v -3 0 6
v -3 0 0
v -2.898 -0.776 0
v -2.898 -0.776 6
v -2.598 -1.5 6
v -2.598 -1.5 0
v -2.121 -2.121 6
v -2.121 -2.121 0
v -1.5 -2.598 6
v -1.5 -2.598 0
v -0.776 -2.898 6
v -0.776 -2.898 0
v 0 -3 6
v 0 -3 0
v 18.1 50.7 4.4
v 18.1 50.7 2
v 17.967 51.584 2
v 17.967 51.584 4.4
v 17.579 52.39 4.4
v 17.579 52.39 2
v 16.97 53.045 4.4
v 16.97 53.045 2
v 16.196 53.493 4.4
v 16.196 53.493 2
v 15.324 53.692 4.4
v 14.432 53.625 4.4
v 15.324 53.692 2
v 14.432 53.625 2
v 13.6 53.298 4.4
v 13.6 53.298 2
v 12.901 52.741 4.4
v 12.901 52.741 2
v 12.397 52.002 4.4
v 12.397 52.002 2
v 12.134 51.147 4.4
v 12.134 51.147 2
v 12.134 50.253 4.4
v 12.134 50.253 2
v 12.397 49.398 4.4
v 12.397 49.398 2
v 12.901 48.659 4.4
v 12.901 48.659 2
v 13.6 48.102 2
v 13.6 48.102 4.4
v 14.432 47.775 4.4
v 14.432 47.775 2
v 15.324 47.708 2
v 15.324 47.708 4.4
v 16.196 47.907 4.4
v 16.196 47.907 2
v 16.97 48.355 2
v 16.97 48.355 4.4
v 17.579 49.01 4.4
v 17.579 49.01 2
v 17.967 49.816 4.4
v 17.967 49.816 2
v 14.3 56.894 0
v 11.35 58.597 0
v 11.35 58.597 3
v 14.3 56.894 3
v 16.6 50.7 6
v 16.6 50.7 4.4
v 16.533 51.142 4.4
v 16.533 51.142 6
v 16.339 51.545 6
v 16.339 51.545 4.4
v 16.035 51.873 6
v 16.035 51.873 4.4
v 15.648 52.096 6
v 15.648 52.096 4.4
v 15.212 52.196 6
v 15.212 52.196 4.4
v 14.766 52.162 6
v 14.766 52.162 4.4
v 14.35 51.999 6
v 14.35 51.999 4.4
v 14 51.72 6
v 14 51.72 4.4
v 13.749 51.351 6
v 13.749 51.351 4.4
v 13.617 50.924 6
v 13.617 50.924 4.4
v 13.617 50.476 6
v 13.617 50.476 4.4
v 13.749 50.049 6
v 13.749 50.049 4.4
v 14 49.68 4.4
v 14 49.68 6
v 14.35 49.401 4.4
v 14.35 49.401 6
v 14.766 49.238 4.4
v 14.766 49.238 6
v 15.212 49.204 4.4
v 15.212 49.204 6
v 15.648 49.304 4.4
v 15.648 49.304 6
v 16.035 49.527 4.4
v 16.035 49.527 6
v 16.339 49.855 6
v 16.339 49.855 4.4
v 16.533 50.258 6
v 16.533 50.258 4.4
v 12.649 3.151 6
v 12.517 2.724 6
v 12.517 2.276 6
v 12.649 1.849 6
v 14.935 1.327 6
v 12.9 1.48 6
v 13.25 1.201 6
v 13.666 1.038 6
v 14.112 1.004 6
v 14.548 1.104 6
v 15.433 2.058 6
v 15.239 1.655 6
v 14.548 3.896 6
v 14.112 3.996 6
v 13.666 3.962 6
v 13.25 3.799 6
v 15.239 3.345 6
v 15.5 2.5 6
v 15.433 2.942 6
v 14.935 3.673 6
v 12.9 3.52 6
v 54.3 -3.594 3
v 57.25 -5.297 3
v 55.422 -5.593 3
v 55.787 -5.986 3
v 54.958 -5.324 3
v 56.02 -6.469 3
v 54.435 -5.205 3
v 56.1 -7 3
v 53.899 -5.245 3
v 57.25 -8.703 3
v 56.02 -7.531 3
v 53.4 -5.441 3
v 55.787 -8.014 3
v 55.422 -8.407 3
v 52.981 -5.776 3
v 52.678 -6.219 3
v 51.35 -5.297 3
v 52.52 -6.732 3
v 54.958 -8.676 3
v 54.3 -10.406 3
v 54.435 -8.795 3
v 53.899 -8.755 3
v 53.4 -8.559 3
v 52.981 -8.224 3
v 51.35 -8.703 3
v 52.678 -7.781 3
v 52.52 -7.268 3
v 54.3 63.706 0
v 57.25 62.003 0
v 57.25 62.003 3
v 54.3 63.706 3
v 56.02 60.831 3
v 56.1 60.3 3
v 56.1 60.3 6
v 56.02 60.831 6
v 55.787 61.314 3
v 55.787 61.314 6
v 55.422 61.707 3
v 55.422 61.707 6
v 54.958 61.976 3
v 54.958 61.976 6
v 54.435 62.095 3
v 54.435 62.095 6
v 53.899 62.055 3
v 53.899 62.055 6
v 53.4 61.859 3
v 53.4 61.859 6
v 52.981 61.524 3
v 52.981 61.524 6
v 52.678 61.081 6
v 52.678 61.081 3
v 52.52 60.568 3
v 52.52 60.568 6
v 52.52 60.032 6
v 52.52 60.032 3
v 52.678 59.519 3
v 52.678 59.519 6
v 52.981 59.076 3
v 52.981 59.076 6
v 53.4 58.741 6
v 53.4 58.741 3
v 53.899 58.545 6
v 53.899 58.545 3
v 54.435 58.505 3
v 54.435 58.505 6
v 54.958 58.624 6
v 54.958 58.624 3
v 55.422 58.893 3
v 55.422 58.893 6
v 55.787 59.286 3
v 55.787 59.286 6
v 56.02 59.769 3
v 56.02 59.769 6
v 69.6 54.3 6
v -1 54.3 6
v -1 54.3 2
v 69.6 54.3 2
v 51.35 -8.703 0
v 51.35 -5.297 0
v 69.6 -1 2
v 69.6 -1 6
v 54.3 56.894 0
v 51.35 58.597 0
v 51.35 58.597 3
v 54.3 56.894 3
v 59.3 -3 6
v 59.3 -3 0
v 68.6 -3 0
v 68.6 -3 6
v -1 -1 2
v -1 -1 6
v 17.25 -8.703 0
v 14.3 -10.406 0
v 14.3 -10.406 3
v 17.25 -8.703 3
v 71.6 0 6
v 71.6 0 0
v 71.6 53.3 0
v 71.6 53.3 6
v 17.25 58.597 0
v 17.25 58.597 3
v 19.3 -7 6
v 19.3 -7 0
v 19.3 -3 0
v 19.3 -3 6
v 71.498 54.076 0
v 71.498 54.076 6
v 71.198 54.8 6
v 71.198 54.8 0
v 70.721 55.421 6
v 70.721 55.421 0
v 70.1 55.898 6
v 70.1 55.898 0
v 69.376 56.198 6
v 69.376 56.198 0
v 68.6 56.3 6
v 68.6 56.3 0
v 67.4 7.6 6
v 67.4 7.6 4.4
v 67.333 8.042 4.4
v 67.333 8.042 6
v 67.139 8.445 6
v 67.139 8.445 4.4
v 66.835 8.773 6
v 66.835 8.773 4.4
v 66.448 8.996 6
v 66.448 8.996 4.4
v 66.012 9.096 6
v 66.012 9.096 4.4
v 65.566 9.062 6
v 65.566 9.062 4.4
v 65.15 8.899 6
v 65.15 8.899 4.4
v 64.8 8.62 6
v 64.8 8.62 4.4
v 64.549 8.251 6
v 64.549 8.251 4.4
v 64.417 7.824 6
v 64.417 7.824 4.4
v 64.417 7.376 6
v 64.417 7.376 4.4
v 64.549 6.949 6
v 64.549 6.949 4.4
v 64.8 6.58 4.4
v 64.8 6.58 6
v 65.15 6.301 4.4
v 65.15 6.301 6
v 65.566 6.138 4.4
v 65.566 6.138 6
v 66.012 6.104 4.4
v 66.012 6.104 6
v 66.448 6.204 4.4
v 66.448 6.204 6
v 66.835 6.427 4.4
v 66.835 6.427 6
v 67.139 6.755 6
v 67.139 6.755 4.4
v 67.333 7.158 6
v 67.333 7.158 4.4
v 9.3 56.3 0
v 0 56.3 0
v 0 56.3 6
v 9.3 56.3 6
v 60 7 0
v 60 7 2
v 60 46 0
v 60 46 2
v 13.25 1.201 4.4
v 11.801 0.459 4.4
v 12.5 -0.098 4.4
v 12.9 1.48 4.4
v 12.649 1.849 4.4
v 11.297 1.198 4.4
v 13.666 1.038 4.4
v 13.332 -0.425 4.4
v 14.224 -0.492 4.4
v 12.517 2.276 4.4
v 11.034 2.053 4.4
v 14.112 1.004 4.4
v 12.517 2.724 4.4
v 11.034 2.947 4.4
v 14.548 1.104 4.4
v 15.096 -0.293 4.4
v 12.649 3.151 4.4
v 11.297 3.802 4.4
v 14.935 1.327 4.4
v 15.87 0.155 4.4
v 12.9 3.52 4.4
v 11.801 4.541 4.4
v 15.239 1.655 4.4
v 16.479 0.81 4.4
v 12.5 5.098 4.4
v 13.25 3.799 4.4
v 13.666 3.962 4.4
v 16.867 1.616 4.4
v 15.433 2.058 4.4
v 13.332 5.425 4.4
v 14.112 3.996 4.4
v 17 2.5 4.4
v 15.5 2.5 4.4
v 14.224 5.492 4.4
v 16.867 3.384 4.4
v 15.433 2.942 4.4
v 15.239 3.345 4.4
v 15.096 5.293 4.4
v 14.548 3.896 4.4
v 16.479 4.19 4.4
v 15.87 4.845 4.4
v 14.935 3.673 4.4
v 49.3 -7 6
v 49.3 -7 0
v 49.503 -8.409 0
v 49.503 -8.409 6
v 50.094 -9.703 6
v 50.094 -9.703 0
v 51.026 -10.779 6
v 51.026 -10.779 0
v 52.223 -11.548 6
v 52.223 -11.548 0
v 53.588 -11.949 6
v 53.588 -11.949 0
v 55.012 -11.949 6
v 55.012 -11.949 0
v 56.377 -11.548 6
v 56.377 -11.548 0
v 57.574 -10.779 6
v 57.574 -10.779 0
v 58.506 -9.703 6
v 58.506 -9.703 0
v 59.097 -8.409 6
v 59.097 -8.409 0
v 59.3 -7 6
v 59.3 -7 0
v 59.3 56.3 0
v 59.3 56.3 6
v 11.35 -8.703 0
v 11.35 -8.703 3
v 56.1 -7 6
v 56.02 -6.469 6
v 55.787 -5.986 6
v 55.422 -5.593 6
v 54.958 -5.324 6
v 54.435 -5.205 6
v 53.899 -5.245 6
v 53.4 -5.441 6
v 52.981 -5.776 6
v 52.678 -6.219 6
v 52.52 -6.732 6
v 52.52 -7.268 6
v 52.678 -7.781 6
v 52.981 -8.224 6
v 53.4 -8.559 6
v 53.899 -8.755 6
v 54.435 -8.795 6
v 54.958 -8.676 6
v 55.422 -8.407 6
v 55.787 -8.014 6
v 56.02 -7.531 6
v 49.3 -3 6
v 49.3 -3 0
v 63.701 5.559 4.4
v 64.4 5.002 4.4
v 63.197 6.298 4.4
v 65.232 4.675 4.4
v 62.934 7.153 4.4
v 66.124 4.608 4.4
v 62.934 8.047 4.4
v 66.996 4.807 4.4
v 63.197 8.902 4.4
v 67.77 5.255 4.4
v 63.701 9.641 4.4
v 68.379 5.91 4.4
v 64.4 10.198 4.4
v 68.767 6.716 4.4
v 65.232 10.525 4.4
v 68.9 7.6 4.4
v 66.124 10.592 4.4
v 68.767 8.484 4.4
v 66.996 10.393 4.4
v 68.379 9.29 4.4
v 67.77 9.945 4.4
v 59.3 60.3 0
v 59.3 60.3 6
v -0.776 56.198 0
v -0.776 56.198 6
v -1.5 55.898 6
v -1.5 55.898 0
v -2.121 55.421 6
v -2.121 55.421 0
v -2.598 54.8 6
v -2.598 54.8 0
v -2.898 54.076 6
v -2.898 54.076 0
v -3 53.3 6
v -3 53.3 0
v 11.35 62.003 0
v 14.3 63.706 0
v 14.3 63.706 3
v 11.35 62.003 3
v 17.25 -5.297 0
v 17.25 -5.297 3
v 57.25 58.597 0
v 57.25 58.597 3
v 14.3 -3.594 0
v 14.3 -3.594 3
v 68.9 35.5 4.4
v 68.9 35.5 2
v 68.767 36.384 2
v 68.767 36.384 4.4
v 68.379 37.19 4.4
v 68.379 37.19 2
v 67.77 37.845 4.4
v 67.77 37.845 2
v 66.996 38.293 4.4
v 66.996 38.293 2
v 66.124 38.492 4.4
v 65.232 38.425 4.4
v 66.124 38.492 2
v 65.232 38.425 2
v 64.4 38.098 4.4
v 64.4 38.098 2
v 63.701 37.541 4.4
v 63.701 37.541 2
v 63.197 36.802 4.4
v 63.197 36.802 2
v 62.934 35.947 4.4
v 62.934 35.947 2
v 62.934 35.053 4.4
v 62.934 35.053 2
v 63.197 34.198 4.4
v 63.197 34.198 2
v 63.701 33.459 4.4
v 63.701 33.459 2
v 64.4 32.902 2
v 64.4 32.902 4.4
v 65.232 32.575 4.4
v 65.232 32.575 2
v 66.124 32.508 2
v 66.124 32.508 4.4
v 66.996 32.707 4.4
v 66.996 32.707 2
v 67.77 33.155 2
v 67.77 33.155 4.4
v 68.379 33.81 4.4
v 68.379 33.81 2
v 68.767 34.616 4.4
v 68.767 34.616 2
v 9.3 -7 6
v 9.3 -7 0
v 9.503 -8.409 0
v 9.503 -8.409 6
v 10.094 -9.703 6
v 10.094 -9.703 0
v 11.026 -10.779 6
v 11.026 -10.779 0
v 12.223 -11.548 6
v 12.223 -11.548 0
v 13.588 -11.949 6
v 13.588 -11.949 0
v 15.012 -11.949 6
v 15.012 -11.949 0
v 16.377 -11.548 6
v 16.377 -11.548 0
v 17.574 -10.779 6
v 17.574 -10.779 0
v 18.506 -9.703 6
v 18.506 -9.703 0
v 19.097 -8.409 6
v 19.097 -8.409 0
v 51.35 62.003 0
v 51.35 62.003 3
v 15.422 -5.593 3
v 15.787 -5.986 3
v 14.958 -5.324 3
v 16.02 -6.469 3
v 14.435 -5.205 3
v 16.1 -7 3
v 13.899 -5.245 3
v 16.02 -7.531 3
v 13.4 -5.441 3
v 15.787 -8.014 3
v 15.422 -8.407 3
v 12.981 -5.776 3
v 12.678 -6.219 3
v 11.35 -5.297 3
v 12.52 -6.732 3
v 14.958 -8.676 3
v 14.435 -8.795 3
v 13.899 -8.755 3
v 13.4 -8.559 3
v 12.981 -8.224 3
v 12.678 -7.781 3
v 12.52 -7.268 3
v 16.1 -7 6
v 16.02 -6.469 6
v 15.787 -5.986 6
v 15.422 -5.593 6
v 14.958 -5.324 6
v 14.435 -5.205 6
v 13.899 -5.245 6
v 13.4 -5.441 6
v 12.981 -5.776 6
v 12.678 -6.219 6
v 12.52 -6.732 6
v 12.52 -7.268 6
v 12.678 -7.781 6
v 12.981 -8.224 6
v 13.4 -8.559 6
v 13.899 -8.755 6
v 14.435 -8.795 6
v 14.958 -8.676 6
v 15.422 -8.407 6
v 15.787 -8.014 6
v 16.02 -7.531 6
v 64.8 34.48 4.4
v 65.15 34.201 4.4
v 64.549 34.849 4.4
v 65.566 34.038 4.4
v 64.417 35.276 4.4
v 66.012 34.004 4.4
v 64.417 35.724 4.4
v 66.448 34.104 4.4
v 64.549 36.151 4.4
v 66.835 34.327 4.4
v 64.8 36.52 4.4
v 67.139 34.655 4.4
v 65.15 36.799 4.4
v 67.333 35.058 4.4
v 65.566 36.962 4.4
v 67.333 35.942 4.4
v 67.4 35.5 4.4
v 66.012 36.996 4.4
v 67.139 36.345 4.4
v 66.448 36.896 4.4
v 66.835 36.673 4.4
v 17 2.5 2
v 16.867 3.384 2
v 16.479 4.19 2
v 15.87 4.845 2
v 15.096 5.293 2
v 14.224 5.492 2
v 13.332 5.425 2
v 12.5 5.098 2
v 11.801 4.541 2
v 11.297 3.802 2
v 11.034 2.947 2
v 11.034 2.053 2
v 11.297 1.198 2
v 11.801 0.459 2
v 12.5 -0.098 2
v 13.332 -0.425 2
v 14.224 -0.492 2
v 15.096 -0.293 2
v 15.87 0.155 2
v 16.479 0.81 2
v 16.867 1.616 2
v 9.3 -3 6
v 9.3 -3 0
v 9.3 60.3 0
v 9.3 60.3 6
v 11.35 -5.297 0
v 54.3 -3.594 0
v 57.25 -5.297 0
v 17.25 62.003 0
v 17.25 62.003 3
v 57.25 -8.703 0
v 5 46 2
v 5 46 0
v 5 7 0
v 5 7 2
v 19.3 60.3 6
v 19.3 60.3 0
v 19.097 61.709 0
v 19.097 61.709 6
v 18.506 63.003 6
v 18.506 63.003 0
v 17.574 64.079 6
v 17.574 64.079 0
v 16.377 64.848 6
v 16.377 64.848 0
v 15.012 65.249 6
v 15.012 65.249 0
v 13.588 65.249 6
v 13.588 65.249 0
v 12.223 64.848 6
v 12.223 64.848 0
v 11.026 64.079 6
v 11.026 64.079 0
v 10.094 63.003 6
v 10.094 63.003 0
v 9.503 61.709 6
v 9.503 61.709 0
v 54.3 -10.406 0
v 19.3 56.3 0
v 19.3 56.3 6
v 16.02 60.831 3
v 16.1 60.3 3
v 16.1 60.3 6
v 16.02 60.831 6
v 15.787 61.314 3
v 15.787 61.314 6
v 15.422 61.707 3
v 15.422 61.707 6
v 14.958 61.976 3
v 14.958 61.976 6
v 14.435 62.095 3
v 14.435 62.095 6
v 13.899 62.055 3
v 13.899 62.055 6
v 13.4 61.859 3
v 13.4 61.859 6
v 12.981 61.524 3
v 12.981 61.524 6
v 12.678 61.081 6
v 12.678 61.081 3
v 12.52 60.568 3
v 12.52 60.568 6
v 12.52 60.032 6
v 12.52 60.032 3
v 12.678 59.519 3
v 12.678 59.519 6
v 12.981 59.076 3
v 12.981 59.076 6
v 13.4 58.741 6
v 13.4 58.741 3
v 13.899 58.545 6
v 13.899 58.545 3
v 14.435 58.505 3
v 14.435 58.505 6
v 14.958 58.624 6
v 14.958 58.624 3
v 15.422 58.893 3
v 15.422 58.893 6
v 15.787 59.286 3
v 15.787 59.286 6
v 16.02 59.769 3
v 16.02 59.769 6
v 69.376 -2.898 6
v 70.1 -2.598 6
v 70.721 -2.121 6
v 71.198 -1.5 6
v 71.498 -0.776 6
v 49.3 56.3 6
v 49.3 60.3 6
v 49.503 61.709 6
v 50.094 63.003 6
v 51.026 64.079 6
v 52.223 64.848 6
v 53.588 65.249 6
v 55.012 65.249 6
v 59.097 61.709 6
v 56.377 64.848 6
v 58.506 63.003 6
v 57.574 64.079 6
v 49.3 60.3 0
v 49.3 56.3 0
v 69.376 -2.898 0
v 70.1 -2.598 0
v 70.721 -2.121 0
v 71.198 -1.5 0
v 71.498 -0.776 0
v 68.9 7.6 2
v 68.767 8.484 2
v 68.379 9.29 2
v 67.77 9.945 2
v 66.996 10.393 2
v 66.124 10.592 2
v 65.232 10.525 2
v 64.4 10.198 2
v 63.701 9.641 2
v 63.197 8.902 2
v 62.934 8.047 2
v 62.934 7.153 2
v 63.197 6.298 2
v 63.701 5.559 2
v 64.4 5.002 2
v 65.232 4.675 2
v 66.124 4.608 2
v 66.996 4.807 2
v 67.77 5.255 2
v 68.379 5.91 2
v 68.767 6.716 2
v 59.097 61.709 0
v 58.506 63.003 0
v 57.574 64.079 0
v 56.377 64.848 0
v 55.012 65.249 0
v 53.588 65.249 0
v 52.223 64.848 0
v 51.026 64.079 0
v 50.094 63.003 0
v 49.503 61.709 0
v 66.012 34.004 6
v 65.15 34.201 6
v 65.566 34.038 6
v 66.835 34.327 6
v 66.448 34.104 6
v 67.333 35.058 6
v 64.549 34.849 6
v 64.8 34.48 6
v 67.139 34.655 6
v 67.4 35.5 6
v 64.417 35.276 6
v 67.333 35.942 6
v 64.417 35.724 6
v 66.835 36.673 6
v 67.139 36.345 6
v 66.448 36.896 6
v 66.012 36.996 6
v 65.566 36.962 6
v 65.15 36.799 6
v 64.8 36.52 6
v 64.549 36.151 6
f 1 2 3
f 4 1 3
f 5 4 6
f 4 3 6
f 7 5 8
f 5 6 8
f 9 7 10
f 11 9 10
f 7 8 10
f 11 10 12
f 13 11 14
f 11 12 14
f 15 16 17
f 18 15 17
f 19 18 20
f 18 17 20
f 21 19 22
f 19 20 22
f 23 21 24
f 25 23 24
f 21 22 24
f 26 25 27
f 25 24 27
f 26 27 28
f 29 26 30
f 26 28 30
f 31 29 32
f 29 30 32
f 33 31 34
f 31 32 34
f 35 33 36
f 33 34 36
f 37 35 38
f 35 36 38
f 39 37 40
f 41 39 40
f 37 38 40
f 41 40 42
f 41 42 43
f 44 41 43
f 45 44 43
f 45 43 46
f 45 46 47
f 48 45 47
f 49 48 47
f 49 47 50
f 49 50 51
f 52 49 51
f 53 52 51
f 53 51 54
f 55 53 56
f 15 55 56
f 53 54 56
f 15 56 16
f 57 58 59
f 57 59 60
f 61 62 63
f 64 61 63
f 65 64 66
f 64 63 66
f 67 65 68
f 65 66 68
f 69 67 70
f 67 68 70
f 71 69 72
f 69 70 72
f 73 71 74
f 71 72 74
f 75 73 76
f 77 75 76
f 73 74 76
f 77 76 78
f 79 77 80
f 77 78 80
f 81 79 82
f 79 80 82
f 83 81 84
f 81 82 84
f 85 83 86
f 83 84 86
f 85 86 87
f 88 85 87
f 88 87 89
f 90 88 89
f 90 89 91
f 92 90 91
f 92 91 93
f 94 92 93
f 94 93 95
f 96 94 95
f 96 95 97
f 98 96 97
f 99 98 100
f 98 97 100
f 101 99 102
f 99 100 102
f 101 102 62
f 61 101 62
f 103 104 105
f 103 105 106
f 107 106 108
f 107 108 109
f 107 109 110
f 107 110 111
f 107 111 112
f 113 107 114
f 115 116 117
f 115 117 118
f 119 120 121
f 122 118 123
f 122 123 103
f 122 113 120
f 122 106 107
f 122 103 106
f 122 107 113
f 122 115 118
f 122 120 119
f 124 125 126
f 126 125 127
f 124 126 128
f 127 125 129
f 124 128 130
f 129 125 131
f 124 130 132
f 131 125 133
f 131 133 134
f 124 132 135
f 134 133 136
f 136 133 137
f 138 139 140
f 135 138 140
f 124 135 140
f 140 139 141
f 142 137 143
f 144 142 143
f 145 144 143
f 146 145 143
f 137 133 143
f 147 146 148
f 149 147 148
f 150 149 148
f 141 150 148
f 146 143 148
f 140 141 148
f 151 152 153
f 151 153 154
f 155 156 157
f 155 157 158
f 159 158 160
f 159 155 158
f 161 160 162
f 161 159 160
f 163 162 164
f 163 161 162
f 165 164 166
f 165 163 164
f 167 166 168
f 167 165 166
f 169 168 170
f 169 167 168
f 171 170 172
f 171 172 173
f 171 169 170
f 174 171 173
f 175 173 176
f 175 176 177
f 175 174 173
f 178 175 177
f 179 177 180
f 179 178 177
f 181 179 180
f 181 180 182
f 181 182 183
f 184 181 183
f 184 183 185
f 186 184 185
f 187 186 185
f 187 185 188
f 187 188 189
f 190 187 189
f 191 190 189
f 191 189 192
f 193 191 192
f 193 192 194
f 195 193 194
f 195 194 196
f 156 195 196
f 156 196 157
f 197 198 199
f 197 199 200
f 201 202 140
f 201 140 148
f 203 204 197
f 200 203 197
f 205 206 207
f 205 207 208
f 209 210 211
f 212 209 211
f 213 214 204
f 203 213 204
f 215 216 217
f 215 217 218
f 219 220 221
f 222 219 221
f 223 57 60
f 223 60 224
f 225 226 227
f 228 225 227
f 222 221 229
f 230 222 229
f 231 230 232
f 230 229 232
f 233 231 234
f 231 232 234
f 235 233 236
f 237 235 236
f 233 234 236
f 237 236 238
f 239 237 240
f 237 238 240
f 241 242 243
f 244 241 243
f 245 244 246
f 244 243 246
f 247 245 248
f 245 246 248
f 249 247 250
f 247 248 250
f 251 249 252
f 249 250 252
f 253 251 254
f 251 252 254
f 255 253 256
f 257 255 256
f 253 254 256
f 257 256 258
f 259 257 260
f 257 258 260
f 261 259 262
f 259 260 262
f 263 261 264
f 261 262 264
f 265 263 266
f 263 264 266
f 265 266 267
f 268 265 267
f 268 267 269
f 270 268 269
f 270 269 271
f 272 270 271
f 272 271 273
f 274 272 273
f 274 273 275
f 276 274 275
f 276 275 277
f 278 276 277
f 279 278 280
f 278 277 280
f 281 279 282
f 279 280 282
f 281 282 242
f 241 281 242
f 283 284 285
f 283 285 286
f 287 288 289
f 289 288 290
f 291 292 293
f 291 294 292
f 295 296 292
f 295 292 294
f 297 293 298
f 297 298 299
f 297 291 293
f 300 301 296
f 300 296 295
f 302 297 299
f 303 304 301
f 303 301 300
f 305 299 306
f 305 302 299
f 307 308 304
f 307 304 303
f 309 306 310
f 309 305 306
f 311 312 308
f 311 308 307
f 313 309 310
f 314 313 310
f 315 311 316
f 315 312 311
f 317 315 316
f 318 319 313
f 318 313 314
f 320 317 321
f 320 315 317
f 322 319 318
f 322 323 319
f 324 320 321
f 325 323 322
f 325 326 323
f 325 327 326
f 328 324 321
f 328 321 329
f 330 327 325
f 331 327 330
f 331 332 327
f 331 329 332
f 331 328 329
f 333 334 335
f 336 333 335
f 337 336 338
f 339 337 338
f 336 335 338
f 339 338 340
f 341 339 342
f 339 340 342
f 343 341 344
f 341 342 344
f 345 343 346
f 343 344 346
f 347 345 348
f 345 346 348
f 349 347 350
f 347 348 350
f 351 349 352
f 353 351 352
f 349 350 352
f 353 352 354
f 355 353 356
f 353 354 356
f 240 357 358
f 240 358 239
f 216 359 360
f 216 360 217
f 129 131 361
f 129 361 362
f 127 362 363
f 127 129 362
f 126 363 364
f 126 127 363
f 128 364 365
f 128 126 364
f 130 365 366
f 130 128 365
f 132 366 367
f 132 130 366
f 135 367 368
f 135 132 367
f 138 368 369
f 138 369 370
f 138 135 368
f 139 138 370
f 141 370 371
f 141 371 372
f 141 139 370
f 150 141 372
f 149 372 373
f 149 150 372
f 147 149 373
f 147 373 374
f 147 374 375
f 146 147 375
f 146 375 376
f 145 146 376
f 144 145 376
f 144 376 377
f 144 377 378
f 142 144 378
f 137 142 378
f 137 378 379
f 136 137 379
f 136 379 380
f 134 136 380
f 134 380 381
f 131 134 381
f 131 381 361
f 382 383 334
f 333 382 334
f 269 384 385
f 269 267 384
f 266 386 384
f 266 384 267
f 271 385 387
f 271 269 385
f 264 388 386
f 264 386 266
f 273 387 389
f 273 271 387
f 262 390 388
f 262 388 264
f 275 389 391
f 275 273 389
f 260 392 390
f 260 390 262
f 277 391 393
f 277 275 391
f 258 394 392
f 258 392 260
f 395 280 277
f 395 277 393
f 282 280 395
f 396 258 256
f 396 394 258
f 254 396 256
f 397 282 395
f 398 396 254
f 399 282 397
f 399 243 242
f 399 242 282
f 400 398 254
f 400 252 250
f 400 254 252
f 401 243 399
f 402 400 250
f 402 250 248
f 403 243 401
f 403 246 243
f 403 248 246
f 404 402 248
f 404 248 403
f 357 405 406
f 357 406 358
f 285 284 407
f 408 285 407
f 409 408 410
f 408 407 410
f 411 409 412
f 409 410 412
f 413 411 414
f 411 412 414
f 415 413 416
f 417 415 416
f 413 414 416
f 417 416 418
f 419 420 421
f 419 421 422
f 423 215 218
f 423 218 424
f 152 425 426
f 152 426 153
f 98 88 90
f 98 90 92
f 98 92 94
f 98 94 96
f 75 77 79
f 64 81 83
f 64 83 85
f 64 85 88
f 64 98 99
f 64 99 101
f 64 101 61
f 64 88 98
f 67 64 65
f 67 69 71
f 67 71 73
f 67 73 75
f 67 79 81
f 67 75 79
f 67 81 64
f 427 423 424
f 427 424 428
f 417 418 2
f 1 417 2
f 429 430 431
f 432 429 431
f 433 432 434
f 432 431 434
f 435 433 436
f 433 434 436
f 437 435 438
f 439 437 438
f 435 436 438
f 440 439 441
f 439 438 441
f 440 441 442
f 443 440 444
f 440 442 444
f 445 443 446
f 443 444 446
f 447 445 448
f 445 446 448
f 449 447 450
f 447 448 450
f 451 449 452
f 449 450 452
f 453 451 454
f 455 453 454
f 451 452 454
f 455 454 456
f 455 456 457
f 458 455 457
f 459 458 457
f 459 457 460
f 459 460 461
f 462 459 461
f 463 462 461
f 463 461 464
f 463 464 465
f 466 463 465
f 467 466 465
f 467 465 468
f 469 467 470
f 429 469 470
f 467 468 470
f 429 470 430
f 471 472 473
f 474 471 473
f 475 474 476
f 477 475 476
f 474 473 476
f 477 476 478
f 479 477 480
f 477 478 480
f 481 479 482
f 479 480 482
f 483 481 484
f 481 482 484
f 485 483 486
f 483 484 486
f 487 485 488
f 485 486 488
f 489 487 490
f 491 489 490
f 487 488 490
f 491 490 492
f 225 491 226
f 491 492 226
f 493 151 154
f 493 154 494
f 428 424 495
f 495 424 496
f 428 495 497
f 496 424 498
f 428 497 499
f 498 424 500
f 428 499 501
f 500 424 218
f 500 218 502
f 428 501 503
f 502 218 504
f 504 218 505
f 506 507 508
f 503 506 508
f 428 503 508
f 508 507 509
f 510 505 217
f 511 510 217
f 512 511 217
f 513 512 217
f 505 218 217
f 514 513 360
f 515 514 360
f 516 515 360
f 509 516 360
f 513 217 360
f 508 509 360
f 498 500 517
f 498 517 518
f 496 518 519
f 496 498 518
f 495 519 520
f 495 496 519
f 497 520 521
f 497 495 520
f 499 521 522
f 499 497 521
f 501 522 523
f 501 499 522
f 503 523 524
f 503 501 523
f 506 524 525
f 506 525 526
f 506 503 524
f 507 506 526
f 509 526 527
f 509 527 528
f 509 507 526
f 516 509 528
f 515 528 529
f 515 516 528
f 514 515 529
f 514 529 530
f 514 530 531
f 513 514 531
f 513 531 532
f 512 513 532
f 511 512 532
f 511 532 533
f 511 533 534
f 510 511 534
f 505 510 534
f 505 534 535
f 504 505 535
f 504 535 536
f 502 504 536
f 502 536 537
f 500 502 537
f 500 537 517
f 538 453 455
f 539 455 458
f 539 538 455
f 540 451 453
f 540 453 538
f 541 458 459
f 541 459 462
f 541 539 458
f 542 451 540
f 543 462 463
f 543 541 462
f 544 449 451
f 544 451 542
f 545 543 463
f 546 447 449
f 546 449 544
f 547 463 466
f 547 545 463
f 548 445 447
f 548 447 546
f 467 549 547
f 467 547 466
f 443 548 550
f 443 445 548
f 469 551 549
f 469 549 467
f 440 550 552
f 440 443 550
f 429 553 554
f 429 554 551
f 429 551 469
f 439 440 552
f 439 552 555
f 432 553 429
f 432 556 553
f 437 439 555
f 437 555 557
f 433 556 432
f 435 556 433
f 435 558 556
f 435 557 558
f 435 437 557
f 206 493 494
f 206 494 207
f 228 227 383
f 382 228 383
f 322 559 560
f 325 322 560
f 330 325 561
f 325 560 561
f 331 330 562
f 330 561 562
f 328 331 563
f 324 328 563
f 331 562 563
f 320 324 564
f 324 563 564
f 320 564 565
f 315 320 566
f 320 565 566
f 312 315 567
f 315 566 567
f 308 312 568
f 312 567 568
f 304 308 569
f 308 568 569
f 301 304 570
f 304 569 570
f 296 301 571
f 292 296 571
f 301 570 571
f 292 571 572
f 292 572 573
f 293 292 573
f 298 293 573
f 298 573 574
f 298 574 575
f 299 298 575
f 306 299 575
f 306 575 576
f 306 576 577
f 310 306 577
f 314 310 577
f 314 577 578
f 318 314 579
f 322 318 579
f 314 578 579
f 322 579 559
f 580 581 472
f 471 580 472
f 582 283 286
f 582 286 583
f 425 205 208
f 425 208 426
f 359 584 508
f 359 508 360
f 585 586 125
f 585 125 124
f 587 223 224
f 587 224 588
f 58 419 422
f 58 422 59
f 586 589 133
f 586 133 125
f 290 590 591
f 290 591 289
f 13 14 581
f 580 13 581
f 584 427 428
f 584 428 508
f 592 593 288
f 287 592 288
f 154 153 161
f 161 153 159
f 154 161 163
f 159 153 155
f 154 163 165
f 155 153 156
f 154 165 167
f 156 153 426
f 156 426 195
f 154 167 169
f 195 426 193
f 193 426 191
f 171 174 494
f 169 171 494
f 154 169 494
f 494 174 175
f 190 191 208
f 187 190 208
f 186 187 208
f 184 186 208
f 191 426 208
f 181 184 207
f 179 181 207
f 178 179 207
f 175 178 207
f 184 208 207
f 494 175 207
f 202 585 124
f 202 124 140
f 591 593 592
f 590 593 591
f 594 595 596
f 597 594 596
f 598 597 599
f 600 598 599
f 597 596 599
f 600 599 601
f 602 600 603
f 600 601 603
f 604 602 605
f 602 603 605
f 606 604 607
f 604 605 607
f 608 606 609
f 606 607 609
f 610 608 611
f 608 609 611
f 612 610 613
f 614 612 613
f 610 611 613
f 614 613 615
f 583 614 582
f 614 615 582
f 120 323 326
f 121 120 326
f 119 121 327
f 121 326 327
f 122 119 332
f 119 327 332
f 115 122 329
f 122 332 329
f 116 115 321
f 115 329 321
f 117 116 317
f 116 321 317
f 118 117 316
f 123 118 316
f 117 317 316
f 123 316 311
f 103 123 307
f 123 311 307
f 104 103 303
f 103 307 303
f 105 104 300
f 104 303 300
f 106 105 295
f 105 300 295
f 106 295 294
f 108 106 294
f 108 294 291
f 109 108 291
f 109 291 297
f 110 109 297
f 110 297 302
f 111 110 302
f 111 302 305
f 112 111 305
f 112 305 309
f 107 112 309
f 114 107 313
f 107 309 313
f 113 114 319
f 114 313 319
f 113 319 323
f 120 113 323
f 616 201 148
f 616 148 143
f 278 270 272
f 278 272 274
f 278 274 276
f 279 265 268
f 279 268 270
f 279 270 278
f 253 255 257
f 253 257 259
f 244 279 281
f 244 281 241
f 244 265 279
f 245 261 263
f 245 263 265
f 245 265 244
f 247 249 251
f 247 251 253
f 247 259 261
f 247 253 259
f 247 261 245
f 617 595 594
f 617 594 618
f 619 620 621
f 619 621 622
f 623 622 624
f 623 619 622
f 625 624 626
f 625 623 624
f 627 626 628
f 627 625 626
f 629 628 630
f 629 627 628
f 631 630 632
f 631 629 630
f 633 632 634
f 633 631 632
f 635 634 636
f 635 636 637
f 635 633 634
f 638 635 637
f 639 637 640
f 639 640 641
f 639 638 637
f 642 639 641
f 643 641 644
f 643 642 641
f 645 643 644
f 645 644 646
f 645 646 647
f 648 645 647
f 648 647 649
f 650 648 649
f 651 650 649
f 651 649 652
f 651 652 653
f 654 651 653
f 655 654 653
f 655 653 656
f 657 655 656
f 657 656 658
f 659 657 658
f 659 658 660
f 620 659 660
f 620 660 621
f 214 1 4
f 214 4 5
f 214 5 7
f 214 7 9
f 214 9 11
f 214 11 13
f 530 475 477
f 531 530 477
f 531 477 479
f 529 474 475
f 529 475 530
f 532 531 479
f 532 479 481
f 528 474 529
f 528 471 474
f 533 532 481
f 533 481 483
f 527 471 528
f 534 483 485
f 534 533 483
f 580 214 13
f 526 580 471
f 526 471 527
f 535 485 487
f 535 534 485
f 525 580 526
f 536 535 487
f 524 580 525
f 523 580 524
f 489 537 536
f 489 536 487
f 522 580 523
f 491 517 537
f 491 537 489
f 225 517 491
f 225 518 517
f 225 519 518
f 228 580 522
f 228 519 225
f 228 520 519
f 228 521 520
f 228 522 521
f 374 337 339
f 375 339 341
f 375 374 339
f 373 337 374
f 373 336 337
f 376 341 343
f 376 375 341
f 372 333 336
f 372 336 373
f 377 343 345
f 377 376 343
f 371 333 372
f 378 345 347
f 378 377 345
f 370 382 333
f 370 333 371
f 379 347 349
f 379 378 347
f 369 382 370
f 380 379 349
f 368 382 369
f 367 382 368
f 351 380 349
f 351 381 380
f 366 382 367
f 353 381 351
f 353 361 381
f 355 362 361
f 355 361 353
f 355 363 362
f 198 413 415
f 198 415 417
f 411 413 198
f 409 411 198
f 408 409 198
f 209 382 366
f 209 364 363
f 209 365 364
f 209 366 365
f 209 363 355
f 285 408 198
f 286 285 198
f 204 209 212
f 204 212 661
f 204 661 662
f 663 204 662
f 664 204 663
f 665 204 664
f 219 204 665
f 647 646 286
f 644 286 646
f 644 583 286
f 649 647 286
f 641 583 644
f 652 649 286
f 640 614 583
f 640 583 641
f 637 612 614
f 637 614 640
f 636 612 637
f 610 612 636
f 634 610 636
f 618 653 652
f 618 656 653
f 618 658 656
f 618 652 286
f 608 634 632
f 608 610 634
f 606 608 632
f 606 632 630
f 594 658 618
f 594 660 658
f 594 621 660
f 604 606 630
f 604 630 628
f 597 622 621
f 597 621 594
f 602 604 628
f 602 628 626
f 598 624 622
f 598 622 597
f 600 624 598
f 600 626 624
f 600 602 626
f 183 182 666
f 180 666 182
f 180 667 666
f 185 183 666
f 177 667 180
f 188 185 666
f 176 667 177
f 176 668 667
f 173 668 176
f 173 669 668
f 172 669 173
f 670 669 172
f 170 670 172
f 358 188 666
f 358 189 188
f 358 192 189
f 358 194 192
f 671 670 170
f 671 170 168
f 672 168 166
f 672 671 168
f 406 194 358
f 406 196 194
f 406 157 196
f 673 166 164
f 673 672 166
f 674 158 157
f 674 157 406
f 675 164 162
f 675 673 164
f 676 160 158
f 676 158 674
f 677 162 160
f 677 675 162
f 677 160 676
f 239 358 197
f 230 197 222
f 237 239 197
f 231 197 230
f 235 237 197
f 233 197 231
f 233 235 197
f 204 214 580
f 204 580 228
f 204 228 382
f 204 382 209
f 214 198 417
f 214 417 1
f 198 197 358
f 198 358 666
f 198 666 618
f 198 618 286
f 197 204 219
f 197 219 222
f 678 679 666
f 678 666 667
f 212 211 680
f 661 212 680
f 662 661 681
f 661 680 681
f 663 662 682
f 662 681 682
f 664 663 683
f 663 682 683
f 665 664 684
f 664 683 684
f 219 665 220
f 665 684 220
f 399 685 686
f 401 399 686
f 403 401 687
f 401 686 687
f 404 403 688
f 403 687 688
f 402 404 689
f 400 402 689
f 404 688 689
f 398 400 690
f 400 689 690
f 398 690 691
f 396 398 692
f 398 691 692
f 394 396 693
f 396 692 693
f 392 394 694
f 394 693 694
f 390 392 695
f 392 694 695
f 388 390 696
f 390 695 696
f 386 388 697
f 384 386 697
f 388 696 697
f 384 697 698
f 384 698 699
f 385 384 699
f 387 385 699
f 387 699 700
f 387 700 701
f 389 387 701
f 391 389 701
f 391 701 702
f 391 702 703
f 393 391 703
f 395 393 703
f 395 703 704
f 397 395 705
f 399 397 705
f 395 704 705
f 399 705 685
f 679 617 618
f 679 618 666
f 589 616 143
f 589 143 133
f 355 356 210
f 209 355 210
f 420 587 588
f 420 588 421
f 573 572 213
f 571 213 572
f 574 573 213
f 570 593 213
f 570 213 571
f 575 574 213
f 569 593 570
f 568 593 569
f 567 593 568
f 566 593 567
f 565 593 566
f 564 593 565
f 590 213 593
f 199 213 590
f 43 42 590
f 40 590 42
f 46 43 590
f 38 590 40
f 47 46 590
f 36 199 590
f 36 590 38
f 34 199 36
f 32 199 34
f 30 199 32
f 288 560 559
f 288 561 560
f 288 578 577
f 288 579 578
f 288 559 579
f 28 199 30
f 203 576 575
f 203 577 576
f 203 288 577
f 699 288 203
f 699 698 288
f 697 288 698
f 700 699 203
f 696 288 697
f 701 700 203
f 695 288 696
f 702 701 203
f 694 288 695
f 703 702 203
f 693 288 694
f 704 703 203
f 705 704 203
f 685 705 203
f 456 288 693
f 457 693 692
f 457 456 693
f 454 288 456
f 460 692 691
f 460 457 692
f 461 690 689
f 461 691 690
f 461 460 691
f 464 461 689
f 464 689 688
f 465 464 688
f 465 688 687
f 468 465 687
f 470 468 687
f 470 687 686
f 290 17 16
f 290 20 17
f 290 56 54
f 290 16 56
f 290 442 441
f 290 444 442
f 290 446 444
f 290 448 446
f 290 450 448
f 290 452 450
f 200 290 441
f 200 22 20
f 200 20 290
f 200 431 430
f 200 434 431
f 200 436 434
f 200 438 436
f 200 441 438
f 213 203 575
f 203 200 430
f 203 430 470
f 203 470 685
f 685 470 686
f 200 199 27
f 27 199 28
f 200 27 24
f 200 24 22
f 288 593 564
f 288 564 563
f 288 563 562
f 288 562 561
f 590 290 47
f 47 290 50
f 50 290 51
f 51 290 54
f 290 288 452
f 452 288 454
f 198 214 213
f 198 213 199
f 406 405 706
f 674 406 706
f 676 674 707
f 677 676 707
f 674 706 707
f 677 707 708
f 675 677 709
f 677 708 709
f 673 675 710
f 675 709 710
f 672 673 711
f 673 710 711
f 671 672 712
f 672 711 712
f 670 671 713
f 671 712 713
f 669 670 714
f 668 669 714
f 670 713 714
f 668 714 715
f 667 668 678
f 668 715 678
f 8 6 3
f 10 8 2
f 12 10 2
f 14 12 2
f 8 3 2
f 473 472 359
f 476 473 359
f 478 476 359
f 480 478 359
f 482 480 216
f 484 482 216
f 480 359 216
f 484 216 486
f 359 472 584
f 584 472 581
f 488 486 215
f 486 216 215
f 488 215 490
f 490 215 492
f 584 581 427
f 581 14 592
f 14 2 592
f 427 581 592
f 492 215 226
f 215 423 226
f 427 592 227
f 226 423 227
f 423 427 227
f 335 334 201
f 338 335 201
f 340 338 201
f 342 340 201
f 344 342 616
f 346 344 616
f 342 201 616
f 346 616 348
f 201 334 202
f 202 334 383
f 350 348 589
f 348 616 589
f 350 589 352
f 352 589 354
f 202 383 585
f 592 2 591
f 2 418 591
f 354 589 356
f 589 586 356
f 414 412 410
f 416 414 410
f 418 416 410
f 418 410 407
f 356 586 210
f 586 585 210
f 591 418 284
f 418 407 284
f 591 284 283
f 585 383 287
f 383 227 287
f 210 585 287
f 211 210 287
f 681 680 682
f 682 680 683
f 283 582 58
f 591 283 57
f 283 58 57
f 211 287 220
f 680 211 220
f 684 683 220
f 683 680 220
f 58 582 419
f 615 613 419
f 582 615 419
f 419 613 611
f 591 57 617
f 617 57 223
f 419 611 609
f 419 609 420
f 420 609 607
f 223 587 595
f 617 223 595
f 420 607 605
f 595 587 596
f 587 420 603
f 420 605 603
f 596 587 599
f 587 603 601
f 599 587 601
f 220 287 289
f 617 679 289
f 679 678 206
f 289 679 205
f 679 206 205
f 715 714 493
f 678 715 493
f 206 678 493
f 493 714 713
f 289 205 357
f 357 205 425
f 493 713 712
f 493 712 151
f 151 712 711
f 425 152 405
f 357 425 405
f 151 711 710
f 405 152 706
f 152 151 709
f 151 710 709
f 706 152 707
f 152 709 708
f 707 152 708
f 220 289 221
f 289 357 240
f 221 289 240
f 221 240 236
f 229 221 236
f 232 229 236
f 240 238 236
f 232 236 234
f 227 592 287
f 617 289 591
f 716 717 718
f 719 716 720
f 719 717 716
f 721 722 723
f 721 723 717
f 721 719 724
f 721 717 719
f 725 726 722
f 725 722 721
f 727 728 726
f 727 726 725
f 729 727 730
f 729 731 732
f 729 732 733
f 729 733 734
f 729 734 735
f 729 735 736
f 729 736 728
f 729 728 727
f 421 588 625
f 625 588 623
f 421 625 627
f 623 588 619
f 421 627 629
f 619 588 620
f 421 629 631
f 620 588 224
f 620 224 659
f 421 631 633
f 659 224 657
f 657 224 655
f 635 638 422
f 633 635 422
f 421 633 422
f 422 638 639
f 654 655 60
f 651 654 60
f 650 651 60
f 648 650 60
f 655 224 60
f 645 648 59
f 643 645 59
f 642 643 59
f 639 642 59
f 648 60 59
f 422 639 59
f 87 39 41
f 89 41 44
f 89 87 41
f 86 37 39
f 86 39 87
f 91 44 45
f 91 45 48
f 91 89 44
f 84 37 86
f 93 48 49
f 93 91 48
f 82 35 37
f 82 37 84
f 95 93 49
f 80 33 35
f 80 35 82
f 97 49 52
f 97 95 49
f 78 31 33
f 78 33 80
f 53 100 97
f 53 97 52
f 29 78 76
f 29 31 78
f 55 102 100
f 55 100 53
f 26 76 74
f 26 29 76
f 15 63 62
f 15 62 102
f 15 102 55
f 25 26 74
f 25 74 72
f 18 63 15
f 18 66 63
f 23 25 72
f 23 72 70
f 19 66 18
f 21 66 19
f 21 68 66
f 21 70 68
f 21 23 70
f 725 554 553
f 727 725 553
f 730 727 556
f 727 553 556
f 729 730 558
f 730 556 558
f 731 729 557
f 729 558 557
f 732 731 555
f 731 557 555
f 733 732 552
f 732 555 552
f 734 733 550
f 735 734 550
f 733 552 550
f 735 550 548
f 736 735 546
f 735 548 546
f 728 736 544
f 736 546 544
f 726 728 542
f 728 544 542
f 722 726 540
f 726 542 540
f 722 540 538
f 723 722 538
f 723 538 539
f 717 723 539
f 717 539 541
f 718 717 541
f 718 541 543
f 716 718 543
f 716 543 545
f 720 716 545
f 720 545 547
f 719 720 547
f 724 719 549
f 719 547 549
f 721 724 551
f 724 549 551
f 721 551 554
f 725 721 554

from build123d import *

# Parameters (mm, degrees)
SKETCH_R        = 1.8
PAD_DEPTH       = 6
SKETCH001_W     = 70.6
SKETCH001_H     = 55.3
POCKET_DEPTH    = 4
SKETCH002_R     = 3
PAD001_DEPTH    = 2.4
SKETCH003_R     = 1.5
PAD002_DEPTH    = 1.6
POCKET001_DEPTH = 3
POCKET002_DEPTH = 3
SKETCH006_W     = 55
SKETCH006_H     = 39
POCKET003_DEPTH = 5


with BuildPart() as part:
    # Sketch → Pad (new body)
    with BuildSketch(Plane.XY):
        with BuildLine():
            ThreePointArc((-3, 0), (-2.12132, -2.12132), (0, -3))
            Line((0, -3), (9.3, -3))
            Line((9.3, -3), (9.3, -7))
            ThreePointArc((9.3, -7), (14.3, -12), (19.3, -7))
            Line((19.3, -7), (19.3, -3))
            Line((19.3, -3), (49.3, -3))
            Line((49.3, -3), (49.3, -7))
            ThreePointArc((49.3, -7), (54.3, -12), (59.3, -7))
            Line((59.3, -7), (59.3, -3))
            Line((59.3, -3), (68.6, -3))
            ThreePointArc((68.6, -3), (70.72132, -2.12132), (71.6, 0))
            Line((71.6, 0), (71.6, 53.3))
            ThreePointArc((71.6, 53.3), (70.72132, 55.42132), (68.6, 56.3))
            Line((59.3, 56.3), (68.6, 56.3))
            Line((59.3, 60.3), (59.3, 56.3))
            ThreePointArc((59.3, 60.3), (54.3, 65.3), (49.3, 60.3))
            Line((49.3, 56.3), (49.3, 60.3))
            Line((19.3, 56.3), (49.3, 56.3))
            Line((19.3, 60.3), (19.3, 56.3))
            ThreePointArc((19.3, 60.3), (14.3, 65.3), (9.3, 60.3))
            Line((9.3, 56.3), (9.3, 60.3))
            Line((0, 56.3), (9.3, 56.3))
            ThreePointArc((0, 56.3), (-2.12132, 55.42132), (-3, 53.3))
            Line((-3, 53.3), (-3, 0))
        make_face()
        with Locations((14.3, -7)):
            Circle(SKETCH_R, mode=Mode.SUBTRACT)
        with Locations((54.3, -7)):
            Circle(SKETCH_R, mode=Mode.SUBTRACT)
        with Locations((54.3, 60.3)):
            Circle(SKETCH_R, mode=Mode.SUBTRACT)
        with Locations((14.3, 60.3)):
            Circle(SKETCH_R, mode=Mode.SUBTRACT)
    extrude(amount=PAD_DEPTH)

    # Sketch001 → Pocket (cut)
    with BuildSketch(Plane.XY.offset(6)):
        with Locations((34.3, 26.65)):
            Rectangle(SKETCH001_W, SKETCH001_H)
    extrude(amount=-POCKET_DEPTH, mode=Mode.SUBTRACT)

    # Sketch002 → Pad001 (new body)
    with BuildSketch(Plane.XY.offset(2)):
        with Locations((15.1, 50.7)):
            Circle(SKETCH002_R)
        with Locations((14, 2.5)):
            Circle(SKETCH002_R)
        with Locations((65.9, 35.5)):
            Circle(SKETCH002_R)
        with Locations((65.9, 7.6)):
            Circle(SKETCH002_R)
    extrude(amount=PAD001_DEPTH)

    # Sketch003 → Pad002 (new body)
    with BuildSketch(Plane.XY.offset(4.4)):
        with Locations((15.1, 50.7)):
            Circle(SKETCH003_R)
        with Locations((14, 2.5)):
            Circle(SKETCH003_R)
        with Locations((65.9, 35.5)):
            Circle(SKETCH003_R)
        with Locations((65.9, 7.6)):
            Circle(SKETCH003_R)
    extrude(amount=PAD002_DEPTH)

    # Sketch004 → Pocket001 (cut)
    with BuildSketch(Plane(origin=(0, 0, 0), x_dir=(1, 0, 0), z_dir=(0, 0, -1))):
        Polygon((11.35, 5.296817), (11.35, 8.703183), (14.3, 10.406367), (17.25, 8.703183), (17.25, 5.296817), (14.3, 3.593633), align=None)
        Polygon((51.35, 5.296817), (51.35, 8.703183), (54.3, 10.406367), (57.25, 8.703183), (57.25, 5.296817), (54.3, 3.593633), align=None)
    extrude(amount=-POCKET001_DEPTH, mode=Mode.SUBTRACT)

    # Sketch005 → Pocket002 (cut)
    with BuildSketch(Plane(origin=(0, 0, 0), x_dir=(1, 0, 0), z_dir=(0, 0, -1))):
        Polygon((11.35, -62.003183), (11.35, -58.596817), (14.3, -56.893633), (17.25, -58.596817), (17.25, -62.003183), (14.3, -63.706367), align=None)
        Polygon((51.35, -62.003183), (51.35, -58.596817), (54.3, -56.893633), (57.25, -58.596817), (57.25, -62.003183), (54.3, -63.706367), align=None)
    extrude(amount=-POCKET002_DEPTH, mode=Mode.SUBTRACT)

    # Sketch006 → Pocket003 (cut)
    with BuildSketch(Plane.XY.offset(2)):
        with Locations((32.5, 26.5)):
            Rectangle(SKETCH006_W, SKETCH006_H)
    extrude(amount=-POCKET003_DEPTH, mode=Mode.SUBTRACT)


solid = part.part
